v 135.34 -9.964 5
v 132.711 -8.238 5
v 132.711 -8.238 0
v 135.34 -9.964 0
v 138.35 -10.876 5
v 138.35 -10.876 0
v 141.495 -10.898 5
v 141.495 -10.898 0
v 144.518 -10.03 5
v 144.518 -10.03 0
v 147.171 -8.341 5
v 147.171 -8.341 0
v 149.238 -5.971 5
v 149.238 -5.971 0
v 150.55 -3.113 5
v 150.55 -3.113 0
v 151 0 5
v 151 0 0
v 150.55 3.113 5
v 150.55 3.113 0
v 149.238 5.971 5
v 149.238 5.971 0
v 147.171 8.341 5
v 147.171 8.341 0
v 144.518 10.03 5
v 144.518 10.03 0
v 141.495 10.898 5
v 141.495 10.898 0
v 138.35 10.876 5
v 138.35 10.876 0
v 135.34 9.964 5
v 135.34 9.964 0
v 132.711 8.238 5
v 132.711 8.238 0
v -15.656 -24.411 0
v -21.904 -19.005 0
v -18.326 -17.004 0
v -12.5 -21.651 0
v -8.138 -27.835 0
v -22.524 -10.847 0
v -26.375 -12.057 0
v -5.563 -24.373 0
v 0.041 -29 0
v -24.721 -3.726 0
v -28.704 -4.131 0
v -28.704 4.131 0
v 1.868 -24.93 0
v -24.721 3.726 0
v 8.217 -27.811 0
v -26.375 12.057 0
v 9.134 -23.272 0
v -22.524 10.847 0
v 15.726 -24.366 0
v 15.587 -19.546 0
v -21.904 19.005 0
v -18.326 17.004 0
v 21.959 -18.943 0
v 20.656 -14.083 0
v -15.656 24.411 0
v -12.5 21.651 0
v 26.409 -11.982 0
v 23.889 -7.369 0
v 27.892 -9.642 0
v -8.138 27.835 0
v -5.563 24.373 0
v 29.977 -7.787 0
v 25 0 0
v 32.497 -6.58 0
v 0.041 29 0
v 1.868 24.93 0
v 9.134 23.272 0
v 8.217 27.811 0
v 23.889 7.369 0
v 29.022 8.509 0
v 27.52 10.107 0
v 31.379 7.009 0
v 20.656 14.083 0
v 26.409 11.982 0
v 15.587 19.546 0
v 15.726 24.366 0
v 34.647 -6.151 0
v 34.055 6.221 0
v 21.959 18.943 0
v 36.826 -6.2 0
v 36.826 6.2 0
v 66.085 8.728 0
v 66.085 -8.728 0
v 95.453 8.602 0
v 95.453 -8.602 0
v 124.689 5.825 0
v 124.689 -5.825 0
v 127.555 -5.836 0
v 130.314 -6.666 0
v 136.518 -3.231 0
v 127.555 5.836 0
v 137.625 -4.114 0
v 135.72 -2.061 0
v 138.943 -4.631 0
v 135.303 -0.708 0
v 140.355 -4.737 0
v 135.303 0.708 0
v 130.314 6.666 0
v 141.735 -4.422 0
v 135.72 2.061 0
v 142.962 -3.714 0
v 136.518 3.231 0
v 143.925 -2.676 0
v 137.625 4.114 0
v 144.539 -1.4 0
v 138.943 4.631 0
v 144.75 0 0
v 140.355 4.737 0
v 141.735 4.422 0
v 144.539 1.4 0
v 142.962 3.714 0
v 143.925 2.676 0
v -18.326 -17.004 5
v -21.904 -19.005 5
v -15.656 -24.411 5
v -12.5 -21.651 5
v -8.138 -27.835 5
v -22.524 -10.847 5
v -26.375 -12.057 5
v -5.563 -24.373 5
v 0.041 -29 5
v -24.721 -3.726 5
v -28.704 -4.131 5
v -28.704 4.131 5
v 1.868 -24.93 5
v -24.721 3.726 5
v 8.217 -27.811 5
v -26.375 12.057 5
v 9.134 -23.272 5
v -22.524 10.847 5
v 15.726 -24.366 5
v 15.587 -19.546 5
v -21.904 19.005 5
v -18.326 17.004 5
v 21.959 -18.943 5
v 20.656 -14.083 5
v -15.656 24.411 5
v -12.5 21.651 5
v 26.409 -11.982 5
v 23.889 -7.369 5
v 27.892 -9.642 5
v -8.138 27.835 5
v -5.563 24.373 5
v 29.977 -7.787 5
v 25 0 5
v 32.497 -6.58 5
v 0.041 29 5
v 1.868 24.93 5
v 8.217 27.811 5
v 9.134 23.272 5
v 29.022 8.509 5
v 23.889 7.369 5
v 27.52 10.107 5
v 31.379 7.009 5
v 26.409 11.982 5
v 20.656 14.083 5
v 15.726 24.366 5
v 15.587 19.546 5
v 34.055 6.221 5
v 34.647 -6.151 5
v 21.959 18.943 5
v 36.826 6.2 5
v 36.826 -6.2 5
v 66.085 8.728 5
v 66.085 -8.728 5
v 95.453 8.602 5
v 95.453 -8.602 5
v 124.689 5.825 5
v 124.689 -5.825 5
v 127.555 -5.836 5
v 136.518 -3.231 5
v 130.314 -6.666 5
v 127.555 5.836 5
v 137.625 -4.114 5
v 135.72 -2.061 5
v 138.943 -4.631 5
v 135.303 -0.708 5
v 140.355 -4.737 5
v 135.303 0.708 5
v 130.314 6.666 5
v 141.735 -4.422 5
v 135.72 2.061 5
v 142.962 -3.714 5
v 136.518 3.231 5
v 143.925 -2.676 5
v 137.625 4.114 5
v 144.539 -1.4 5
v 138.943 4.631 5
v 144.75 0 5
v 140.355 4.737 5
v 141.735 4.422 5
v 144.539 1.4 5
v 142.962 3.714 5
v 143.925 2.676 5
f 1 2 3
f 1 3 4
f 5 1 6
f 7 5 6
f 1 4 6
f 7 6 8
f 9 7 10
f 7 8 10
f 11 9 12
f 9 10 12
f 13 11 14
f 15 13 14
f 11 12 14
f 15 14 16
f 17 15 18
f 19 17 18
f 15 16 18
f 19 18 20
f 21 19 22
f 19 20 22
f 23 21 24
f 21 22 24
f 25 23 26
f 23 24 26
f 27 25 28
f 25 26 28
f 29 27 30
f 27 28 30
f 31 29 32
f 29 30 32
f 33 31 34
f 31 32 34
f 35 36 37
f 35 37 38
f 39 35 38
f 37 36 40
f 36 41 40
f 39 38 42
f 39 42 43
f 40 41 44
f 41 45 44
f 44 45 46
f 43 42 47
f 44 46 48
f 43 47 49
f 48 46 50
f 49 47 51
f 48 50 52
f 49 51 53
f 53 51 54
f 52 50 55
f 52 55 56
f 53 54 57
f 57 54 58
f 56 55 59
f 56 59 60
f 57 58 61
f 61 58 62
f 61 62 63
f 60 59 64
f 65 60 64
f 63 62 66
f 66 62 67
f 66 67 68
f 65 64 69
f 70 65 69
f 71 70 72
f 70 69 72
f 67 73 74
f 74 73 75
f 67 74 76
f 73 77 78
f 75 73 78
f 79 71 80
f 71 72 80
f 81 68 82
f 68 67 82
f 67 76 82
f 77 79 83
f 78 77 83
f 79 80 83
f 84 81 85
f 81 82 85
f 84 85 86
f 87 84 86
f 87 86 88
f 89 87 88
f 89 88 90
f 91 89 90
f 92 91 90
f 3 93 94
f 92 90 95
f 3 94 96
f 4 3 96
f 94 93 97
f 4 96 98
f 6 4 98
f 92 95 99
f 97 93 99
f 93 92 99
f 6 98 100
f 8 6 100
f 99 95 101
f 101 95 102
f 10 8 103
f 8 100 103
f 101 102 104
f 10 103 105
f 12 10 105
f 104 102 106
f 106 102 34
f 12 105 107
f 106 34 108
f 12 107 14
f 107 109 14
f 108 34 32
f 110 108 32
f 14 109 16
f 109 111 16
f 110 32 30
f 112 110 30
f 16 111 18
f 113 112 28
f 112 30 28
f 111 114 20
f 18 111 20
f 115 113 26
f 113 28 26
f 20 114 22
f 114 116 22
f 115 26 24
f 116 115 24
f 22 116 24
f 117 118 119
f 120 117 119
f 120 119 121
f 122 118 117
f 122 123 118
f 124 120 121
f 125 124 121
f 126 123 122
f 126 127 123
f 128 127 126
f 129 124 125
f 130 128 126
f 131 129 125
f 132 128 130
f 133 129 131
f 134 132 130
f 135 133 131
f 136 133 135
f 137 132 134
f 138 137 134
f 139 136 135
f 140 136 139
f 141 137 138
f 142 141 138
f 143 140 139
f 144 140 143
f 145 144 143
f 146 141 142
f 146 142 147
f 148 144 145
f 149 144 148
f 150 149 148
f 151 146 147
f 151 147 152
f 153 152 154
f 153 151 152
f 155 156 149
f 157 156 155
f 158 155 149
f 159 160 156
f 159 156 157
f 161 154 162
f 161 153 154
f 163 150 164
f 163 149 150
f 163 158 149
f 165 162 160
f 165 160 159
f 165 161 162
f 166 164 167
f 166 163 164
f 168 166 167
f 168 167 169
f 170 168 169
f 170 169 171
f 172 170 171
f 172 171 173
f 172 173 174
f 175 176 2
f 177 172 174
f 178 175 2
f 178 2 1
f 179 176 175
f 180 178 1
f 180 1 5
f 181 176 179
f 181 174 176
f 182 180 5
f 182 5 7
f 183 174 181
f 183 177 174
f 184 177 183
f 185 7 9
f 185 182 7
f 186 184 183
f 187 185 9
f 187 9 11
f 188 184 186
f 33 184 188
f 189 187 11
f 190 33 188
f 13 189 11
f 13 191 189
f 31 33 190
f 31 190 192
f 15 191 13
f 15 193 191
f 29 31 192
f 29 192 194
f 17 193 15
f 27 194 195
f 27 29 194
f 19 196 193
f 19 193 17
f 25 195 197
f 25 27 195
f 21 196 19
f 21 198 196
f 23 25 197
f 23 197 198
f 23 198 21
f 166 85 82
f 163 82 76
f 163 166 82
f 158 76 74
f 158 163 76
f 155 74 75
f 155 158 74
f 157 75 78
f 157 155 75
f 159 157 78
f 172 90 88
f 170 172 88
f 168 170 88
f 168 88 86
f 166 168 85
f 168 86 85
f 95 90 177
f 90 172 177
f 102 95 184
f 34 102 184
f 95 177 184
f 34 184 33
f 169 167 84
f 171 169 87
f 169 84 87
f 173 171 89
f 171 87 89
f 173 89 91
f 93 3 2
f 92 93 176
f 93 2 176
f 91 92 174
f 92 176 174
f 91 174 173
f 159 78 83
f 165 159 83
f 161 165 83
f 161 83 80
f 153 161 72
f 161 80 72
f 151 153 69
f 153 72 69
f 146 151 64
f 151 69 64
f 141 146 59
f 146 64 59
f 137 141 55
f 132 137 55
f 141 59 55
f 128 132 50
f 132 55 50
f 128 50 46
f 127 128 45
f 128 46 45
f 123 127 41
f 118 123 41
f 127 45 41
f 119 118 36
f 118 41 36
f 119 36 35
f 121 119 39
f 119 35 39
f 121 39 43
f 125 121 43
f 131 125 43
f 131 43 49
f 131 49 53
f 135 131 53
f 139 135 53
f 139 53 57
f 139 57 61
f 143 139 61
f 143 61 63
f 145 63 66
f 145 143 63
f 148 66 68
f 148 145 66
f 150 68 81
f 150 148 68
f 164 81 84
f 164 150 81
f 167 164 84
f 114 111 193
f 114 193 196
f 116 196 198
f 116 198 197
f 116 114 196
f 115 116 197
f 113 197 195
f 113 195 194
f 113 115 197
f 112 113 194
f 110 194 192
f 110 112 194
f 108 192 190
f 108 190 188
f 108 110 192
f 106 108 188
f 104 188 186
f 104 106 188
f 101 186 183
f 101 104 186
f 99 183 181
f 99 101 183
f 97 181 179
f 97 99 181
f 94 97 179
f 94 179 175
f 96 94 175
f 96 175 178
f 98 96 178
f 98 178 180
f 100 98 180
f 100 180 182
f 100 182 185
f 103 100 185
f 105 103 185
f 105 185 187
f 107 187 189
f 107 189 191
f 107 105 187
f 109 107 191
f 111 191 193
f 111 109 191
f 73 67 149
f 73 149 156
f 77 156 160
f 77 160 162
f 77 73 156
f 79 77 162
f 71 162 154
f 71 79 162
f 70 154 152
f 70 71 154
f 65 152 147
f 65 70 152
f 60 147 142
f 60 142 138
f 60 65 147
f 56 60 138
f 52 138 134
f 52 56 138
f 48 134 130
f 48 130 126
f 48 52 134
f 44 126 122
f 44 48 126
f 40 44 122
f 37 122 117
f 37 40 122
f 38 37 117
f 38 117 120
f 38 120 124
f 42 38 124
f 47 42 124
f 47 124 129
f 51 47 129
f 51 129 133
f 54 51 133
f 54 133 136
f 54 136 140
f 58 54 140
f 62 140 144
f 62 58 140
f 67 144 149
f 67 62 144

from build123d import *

# Parameters (mm, degrees)
F0_R     = 25
F0_R_2   = 4.75
F1_DEPTH = 5
F2_R     = 10


with BuildPart() as f1:
    # F0 (on Top) → F1 (new body)
    with BuildSketch(Plane.XY):
        with BuildLine():
            ThreePointArc((130.202041, 5), (79.383877, 9), (28.565714, 5))
            ThreePointArc((28.565714, 5), (-29, 0), (28.565714, -5))
            ThreePointArc((28.565714, -5), (79.383877, -9), (130.202041, -5))
            ThreePointArc((130.202041, -5), (151, 0), (130.202041, 5))
        make_face()
        Circle(F0_R, mode=Mode.SUBTRACT)
        with Locations((140, 0)):
            Circle(F0_R_2, mode=Mode.SUBTRACT)
    extrude(amount=F1_DEPTH)

    # F2
    f2_edges = [f1.edges().sort_by_distance(p)[0] for p in [
        (28.565714, -5, 2.5),
        (28.565714, 5, 2.5),
        (130.202041, 5, 2.5),
        (130.202041, -5, 2.5),
    ]]
    fillet(f2_edges, radius=F2_R)


solid = f1.part
